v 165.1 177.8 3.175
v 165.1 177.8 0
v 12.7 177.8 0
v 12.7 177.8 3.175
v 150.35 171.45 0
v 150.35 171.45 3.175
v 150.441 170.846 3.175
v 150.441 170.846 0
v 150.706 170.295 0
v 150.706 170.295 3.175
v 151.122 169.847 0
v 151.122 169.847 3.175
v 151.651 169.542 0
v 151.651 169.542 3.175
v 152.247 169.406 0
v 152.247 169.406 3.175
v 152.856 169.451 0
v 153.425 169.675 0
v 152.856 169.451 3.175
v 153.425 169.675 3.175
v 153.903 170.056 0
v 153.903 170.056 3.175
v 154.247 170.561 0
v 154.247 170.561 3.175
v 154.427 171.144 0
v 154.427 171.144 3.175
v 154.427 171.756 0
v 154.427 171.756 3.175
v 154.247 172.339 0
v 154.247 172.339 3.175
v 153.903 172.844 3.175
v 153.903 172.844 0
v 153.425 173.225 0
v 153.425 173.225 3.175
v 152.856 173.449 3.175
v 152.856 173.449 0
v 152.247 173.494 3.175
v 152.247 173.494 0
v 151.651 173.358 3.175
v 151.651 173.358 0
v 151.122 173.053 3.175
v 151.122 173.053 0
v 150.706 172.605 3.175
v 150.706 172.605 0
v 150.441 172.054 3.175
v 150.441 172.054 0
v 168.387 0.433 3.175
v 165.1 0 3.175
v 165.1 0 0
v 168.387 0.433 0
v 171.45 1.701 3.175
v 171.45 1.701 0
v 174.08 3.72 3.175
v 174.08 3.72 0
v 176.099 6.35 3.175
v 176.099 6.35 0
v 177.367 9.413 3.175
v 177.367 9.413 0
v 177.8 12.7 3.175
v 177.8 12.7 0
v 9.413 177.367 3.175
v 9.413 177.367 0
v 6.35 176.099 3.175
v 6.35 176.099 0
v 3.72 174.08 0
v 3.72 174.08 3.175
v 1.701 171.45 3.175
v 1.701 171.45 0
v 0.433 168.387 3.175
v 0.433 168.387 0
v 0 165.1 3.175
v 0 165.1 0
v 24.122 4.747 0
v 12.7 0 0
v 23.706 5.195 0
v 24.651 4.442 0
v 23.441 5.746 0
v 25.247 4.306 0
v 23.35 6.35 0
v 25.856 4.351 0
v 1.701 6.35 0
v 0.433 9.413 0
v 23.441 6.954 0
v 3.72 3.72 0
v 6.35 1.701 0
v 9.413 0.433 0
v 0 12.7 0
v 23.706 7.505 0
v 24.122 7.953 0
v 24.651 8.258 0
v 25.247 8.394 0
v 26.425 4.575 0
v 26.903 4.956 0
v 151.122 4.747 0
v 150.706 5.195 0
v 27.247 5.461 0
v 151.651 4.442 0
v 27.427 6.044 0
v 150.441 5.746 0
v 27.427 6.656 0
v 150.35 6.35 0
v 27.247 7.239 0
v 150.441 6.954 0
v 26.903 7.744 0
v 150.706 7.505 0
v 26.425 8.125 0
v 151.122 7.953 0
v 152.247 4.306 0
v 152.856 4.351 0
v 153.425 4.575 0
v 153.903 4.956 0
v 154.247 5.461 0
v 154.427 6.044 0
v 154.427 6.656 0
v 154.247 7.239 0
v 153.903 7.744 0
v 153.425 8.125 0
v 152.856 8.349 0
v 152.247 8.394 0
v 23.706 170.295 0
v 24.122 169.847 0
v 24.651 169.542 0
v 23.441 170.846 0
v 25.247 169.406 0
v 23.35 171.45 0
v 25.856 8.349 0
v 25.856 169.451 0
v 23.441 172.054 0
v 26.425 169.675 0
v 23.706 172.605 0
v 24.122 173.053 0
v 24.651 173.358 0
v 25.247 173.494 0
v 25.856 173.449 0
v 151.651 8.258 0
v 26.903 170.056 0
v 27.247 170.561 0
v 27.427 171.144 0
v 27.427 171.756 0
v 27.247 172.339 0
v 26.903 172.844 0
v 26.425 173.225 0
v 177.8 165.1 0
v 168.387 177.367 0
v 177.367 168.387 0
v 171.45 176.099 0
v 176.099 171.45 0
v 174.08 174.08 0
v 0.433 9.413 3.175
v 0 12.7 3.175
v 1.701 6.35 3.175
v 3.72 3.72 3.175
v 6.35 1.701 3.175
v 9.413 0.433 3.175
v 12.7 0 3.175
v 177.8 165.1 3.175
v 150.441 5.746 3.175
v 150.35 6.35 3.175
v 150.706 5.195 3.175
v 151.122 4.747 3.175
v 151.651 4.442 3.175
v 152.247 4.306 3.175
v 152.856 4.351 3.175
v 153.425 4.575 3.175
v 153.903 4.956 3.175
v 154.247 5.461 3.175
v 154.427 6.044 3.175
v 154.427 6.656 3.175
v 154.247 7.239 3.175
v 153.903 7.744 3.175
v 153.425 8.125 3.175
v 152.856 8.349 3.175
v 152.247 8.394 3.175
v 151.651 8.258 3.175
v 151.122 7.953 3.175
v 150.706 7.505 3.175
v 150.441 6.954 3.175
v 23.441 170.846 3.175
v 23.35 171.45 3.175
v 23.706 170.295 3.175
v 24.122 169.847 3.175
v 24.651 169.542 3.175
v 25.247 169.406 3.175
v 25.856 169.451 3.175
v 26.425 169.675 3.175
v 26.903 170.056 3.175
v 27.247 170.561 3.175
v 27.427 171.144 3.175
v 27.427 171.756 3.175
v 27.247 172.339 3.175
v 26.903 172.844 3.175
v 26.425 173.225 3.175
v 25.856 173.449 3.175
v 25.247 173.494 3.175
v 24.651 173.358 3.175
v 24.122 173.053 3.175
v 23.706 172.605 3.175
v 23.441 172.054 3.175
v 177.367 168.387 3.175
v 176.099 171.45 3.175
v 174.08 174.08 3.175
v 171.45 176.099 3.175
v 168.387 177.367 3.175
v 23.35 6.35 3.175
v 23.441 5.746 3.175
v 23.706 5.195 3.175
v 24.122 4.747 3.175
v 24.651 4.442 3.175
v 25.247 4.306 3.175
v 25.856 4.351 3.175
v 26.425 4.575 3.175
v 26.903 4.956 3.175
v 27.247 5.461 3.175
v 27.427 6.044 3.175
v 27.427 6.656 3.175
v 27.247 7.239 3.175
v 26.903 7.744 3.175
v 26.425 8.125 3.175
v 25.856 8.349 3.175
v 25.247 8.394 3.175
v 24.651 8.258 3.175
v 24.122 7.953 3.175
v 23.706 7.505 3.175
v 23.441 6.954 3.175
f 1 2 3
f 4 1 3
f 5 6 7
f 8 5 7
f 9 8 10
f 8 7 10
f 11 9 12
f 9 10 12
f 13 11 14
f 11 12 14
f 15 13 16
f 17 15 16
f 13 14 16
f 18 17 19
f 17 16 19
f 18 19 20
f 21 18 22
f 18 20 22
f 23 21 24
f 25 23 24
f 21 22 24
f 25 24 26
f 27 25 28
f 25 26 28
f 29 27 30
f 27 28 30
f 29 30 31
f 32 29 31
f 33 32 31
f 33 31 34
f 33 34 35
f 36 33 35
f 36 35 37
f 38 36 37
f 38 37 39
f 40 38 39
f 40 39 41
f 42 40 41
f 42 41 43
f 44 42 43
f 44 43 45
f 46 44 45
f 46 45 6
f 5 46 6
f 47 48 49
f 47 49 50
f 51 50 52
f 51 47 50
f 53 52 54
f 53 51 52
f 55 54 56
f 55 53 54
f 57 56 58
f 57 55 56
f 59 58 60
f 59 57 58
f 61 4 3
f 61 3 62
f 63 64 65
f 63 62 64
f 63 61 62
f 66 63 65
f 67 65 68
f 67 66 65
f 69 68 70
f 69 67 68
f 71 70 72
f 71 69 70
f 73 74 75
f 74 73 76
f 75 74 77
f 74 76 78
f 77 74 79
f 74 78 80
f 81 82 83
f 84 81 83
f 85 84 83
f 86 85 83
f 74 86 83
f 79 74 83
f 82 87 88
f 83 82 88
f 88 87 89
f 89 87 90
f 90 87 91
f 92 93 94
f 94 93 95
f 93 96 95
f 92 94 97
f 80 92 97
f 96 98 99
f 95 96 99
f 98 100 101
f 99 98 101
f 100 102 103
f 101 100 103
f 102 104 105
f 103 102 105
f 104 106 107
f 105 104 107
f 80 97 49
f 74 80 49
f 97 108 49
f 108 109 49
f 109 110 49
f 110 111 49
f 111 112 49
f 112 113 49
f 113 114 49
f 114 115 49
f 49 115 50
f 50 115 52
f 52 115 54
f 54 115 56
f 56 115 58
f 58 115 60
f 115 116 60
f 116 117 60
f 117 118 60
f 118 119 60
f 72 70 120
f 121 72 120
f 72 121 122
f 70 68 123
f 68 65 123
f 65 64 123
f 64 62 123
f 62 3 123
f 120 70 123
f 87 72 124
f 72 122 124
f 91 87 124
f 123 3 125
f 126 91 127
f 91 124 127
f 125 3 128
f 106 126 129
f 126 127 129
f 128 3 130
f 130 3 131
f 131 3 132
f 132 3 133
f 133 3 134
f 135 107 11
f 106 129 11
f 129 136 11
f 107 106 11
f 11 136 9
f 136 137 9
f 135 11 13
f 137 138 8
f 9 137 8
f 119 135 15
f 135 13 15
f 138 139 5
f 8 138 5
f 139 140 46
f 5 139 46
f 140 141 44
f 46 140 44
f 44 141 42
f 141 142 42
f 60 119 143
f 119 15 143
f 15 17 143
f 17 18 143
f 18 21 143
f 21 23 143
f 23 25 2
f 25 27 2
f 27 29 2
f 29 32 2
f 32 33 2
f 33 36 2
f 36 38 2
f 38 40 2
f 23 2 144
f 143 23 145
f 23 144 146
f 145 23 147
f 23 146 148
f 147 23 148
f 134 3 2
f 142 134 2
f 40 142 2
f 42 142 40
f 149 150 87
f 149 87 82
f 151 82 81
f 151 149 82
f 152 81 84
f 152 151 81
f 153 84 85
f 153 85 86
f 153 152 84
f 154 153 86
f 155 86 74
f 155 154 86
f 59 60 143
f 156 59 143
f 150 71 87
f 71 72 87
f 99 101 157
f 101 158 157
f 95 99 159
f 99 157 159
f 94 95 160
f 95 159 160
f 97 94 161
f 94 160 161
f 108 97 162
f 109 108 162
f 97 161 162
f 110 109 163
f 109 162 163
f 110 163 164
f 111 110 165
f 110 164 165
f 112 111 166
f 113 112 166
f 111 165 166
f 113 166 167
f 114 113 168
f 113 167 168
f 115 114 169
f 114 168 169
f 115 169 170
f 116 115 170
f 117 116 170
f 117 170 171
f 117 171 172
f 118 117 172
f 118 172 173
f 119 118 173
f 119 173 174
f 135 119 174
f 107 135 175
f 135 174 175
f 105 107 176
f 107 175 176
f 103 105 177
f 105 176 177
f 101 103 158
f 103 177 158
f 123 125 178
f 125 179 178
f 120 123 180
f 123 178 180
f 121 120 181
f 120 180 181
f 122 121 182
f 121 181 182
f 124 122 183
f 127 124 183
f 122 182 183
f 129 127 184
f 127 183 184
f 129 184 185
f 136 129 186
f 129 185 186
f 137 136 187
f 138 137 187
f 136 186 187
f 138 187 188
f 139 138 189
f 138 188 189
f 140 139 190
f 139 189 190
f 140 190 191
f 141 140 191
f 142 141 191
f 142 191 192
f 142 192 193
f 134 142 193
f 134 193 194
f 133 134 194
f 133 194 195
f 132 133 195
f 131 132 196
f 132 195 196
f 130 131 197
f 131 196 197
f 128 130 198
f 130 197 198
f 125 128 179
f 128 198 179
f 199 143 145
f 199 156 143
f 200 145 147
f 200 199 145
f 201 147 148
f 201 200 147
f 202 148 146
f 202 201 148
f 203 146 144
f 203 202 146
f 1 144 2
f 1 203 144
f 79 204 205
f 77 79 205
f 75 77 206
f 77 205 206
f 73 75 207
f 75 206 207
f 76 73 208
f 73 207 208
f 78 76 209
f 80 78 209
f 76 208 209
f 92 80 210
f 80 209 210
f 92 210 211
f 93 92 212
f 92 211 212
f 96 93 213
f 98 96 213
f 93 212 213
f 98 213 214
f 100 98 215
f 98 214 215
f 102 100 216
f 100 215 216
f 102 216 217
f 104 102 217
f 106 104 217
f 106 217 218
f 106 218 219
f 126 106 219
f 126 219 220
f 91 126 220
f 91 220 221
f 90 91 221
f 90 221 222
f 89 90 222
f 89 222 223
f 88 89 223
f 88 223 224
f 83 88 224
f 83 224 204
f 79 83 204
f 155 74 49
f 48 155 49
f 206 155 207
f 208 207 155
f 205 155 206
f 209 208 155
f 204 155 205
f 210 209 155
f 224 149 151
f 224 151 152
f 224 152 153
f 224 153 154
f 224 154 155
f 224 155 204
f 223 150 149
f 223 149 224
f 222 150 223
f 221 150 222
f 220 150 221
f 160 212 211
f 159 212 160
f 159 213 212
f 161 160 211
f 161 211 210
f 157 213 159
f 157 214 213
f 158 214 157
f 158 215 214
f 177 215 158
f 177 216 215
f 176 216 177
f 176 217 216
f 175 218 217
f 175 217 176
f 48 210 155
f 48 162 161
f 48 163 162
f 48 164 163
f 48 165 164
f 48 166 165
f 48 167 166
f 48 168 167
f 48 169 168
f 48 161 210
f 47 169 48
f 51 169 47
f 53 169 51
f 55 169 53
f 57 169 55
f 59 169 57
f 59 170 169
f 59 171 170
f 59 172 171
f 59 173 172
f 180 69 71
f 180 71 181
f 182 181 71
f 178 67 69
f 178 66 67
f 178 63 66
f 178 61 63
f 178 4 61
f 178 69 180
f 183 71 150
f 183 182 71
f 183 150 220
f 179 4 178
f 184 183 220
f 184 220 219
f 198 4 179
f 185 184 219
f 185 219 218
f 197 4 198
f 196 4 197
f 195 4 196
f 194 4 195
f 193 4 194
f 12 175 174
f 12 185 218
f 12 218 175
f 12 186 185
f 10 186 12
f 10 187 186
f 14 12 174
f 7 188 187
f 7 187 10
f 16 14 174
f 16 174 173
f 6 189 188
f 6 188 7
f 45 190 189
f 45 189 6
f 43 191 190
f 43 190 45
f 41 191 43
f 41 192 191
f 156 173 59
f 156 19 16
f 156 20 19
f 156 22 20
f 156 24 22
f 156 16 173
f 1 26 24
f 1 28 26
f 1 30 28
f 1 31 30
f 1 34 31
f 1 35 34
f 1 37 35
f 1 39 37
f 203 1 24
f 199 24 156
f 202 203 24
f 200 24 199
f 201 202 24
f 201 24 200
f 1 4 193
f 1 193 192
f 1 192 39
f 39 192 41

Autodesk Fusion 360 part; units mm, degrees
sketch "Sketch1" plane through (0, 0, 0) normal (0, 0, 1) x (1, 0, 0)
  line L0 (0, 0) -> (177.8, 0)
  line L1 (177.8, 0) -> (177.8, 177.8)
  line L2 (177.8, 177.8) -> (0, 177.8)
  line L3 (0, 177.8) -> (0, 0)
  dimension "d2" = 177.8
  dimension "d3" = 177.8
extrude "Extrude1" add sketch "Sketch1" along normal blind 3.175
fillet "Fillet1" radius 12.7 4 edges at (177.8, 0, 1.5875) (0, 0, 1.5875) (177.8, 177.8, 1.5875) (0, 177.8, 1.5875)
sketch "Sketch2" plane through (0, 0, 3.175) normal (0, 0, 1) x (-1, 0, 0)
  arc A0 (-12.7, -177.8) -> (0, -165.1) centre (-12.7, -165.1) ccw
  line L0 (0, -165.1) -> (0, -12.7)
  arc A1 (0, -12.7) -> (-12.7, 0) centre (-12.7, -12.7) ccw
  line L1 (-12.7, 0) -> (-165.1, 0)
  arc A2 (-165.1, 0) -> (-177.8, -12.7) centre (-165.1, -12.7) ccw
  line L2 (-177.8, -12.7) -> (-177.8, -165.1)
  arc A3 (-177.8, -165.1) -> (-165.1, -177.8) centre (-165.1, -165.1) ccw
  line L3 (-165.1, -177.8) -> (-12.7, -177.8)
  line L4 (-25.4, -171.45) -> (-152.4, -171.45) construction
  line L5 (-152.4, -171.45) -> (-152.4, -6.35) construction
  line L6 (-152.4, -6.35) -> (-25.4, -6.35) construction
  line L7 (-25.4, -6.35) -> (-25.4, -171.45) construction
  line L8 (-152.4, -100.0288) -> (-177.8, -100.0288) construction
  line L9 (-25.4, -101.0393) -> (0, -101.0393) construction
  line L10 (-70.6928, -171.45) -> (-70.6928, -177.8) construction
  line L11 (-68.6718, -6.35) -> (-68.6718, 0) construction
  circle A4 centre (-152.4, -6.35) radius 2.05
  dimension "d8" = 25.4
  dimension "d9" = 6.35
  dimension "d10" = 4.1
extrude "Extrude2" cut sketch "Sketch2" against normal through all contours A4
pattern_linear "R-Pattern1" count 2 spacing 127 along (-1, 0, 0) count 2 spacing 165.1 along (0, 1, 0) of "Extrude2"
equation "side = 7 in"
equation "d2 = side"
equation "d3 = side"
equation "d4 = ( 1 / 8 ) * 1 in"
